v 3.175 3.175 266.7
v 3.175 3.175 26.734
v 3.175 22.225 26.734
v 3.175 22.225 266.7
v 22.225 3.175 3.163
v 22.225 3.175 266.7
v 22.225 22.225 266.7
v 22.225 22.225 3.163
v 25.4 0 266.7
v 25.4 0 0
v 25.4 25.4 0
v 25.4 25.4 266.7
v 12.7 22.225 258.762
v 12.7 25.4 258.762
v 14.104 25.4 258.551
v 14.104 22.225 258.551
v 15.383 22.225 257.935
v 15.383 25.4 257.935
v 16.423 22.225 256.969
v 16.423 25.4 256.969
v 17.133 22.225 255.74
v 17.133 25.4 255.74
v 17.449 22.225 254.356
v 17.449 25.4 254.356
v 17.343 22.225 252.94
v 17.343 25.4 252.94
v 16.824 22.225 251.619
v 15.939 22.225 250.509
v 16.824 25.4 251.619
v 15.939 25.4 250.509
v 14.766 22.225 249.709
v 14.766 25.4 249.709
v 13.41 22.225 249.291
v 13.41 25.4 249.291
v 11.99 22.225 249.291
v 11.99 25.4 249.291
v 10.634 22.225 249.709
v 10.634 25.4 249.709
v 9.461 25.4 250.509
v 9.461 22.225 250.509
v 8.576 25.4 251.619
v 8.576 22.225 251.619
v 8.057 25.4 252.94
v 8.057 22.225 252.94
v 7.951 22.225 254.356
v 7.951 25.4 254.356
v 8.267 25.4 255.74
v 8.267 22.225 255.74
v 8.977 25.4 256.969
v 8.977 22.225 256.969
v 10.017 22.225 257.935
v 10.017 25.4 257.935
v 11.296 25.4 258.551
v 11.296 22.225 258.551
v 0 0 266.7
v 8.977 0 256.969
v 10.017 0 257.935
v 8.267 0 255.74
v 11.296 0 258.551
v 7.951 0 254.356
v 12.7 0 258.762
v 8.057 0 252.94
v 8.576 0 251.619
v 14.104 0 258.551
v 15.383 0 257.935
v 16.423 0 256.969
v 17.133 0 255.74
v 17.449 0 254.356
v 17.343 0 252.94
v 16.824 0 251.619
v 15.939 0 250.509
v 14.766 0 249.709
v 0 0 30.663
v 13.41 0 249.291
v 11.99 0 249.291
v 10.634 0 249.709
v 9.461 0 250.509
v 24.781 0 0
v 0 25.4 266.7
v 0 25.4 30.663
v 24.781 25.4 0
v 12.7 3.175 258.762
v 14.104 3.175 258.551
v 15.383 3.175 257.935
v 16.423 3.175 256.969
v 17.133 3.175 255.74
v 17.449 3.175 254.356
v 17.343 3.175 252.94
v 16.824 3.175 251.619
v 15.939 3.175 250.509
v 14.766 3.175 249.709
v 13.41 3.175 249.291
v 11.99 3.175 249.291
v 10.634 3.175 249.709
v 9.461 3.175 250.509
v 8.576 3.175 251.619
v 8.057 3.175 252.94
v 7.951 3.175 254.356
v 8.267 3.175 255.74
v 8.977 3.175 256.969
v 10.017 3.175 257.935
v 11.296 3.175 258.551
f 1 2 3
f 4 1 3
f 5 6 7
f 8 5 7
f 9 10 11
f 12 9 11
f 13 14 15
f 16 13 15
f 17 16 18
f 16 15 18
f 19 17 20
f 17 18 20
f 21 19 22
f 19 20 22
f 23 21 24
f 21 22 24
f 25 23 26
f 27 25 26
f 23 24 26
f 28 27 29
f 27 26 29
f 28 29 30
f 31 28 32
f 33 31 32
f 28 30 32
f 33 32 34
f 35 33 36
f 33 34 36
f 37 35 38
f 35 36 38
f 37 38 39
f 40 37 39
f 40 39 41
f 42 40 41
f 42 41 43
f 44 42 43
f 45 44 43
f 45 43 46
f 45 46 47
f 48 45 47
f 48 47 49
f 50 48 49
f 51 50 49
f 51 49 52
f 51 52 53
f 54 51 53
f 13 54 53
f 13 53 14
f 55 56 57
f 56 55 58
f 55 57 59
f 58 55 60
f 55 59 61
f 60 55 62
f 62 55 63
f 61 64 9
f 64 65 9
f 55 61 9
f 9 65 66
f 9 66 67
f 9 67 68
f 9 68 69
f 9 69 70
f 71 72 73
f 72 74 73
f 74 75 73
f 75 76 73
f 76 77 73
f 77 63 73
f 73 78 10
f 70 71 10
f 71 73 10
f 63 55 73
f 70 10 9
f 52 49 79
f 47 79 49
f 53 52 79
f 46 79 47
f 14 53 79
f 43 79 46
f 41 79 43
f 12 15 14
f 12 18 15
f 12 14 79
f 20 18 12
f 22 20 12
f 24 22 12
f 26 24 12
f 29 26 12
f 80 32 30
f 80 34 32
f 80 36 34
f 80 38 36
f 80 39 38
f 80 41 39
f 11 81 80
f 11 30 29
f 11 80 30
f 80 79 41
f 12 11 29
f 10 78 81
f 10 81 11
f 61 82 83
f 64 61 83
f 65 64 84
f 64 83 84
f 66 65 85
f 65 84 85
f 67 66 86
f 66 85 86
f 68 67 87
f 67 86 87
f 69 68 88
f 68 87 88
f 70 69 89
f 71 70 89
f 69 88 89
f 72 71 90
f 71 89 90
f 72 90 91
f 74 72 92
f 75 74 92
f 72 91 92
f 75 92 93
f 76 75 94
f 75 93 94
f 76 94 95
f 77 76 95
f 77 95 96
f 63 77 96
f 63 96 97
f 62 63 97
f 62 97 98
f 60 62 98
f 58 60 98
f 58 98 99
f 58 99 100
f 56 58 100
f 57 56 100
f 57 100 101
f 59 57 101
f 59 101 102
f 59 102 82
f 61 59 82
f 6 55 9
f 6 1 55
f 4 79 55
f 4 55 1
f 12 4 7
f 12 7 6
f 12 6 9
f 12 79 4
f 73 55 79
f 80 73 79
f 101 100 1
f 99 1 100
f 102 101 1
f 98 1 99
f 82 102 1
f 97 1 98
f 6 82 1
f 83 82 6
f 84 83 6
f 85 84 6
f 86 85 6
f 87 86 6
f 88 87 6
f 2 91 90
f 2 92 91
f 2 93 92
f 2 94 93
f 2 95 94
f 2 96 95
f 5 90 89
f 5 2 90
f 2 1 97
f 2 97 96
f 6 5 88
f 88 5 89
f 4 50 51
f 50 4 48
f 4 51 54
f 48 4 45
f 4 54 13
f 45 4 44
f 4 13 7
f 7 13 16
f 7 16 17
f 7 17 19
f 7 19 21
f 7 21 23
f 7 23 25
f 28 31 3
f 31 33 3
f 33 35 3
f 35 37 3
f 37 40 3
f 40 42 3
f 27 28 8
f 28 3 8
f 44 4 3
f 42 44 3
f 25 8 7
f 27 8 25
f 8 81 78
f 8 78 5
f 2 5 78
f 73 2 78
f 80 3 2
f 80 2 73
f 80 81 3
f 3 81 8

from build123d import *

# Parameters (mm, degrees)
SKETCH1_W           = 25.4
SKETCH1_H           = 25.4
SKETCH1_W_2         = 19.05
SKETCH1_H_2         = 19.05
BOSS_EXTRUDE1_DEPTH = 266.7
CUT_EXTRUDE1_DEPTH  = 270.108175275
SKETCH3_R           = 4.7625
CUT_EXTRUDE2_DEPTH  = 270.108175275


with BuildPart() as part:
    # Sketch1 → Boss-Extrude1 (new body)
    with BuildSketch(Plane.XY):
        with Locations((12.7, 12.7)):
            Rectangle(SKETCH1_W, SKETCH1_H)
        with Locations((12.7, 12.7)):
            Rectangle(SKETCH1_W_2, SKETCH1_H_2, mode=Mode.SUBTRACT)
    extrude(amount=BOSS_EXTRUDE1_DEPTH)

    # Sketch2 → Cut-Extrude1 (cut, through all)
    with BuildSketch(Plane(origin=(0, 25.4, 0), x_dir=(1, 0, 0), z_dir=(0, 1, 0))):
        Polygon((28.218627474, 4.252994852), (-38.643180904, -78.477766606), (-121.852589488, 10.228955552), (-14.467388396, 75.01098645), align=None)
    extrude(amount=-CUT_EXTRUDE1_DEPTH, mode=Mode.SUBTRACT)

    # Sketch3 → Cut-Extrude2 (cut, through all)
    with BuildSketch(Plane(origin=(0, 25.4, 0), x_dir=(1, 0, 0), z_dir=(0, 1, 0))):
        with Locations(Location((12.7, -254, 0), (0, 0, 270))):
            Circle(SKETCH3_R)
    extrude(amount=-CUT_EXTRUDE2_DEPTH, mode=Mode.SUBTRACT)


solid = part.part
